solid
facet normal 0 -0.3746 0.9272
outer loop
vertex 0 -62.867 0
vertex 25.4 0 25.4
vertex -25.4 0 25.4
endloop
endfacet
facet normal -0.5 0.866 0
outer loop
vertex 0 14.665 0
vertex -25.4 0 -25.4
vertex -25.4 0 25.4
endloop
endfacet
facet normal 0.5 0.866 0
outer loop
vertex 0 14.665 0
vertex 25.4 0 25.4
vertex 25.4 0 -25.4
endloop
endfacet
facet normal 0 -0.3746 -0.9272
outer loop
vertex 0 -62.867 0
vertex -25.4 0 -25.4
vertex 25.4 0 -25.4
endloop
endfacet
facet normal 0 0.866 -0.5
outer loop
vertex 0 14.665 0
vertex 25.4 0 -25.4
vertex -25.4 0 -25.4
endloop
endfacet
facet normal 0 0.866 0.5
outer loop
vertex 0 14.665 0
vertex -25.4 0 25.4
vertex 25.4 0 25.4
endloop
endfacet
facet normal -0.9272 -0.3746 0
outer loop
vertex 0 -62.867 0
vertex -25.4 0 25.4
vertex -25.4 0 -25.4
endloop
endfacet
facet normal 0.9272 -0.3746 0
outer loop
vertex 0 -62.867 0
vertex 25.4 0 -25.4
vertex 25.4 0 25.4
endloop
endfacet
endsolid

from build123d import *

# Parameters (mm, degrees)
F0_W      = 50.8
F0_H      = 50.8
F1_FACE_W = 50.8
F1_FACE_H = 50.8


# Not quite as in the source:
# - an extrude whose draft closes it to a point is written as a loft to that point


with BuildPart() as f1:
    # F0 (on Front) → F1 section 0
    with BuildSketch(Plane.XZ, mode=Mode.PRIVATE) as f1_s0:
        Rectangle(F0_W, F0_H)
    loft([f1_s0.sketch, Vertex(0, -62.8672060768, 0)], ruled=True)

    # F1_face (on face) → F2 section 0
    with BuildSketch(Plane(origin=(0, 0, 0), x_dir=(1, 0, 0), z_dir=(0, 1, 0)), mode=Mode.PRIVATE) as f2_s0:
        Rectangle(F1_FACE_W, F1_FACE_H)
    loft([f2_s0.sketch, Vertex(0, 14.6646968374, 0)], ruled=True)


solid = f1.part
